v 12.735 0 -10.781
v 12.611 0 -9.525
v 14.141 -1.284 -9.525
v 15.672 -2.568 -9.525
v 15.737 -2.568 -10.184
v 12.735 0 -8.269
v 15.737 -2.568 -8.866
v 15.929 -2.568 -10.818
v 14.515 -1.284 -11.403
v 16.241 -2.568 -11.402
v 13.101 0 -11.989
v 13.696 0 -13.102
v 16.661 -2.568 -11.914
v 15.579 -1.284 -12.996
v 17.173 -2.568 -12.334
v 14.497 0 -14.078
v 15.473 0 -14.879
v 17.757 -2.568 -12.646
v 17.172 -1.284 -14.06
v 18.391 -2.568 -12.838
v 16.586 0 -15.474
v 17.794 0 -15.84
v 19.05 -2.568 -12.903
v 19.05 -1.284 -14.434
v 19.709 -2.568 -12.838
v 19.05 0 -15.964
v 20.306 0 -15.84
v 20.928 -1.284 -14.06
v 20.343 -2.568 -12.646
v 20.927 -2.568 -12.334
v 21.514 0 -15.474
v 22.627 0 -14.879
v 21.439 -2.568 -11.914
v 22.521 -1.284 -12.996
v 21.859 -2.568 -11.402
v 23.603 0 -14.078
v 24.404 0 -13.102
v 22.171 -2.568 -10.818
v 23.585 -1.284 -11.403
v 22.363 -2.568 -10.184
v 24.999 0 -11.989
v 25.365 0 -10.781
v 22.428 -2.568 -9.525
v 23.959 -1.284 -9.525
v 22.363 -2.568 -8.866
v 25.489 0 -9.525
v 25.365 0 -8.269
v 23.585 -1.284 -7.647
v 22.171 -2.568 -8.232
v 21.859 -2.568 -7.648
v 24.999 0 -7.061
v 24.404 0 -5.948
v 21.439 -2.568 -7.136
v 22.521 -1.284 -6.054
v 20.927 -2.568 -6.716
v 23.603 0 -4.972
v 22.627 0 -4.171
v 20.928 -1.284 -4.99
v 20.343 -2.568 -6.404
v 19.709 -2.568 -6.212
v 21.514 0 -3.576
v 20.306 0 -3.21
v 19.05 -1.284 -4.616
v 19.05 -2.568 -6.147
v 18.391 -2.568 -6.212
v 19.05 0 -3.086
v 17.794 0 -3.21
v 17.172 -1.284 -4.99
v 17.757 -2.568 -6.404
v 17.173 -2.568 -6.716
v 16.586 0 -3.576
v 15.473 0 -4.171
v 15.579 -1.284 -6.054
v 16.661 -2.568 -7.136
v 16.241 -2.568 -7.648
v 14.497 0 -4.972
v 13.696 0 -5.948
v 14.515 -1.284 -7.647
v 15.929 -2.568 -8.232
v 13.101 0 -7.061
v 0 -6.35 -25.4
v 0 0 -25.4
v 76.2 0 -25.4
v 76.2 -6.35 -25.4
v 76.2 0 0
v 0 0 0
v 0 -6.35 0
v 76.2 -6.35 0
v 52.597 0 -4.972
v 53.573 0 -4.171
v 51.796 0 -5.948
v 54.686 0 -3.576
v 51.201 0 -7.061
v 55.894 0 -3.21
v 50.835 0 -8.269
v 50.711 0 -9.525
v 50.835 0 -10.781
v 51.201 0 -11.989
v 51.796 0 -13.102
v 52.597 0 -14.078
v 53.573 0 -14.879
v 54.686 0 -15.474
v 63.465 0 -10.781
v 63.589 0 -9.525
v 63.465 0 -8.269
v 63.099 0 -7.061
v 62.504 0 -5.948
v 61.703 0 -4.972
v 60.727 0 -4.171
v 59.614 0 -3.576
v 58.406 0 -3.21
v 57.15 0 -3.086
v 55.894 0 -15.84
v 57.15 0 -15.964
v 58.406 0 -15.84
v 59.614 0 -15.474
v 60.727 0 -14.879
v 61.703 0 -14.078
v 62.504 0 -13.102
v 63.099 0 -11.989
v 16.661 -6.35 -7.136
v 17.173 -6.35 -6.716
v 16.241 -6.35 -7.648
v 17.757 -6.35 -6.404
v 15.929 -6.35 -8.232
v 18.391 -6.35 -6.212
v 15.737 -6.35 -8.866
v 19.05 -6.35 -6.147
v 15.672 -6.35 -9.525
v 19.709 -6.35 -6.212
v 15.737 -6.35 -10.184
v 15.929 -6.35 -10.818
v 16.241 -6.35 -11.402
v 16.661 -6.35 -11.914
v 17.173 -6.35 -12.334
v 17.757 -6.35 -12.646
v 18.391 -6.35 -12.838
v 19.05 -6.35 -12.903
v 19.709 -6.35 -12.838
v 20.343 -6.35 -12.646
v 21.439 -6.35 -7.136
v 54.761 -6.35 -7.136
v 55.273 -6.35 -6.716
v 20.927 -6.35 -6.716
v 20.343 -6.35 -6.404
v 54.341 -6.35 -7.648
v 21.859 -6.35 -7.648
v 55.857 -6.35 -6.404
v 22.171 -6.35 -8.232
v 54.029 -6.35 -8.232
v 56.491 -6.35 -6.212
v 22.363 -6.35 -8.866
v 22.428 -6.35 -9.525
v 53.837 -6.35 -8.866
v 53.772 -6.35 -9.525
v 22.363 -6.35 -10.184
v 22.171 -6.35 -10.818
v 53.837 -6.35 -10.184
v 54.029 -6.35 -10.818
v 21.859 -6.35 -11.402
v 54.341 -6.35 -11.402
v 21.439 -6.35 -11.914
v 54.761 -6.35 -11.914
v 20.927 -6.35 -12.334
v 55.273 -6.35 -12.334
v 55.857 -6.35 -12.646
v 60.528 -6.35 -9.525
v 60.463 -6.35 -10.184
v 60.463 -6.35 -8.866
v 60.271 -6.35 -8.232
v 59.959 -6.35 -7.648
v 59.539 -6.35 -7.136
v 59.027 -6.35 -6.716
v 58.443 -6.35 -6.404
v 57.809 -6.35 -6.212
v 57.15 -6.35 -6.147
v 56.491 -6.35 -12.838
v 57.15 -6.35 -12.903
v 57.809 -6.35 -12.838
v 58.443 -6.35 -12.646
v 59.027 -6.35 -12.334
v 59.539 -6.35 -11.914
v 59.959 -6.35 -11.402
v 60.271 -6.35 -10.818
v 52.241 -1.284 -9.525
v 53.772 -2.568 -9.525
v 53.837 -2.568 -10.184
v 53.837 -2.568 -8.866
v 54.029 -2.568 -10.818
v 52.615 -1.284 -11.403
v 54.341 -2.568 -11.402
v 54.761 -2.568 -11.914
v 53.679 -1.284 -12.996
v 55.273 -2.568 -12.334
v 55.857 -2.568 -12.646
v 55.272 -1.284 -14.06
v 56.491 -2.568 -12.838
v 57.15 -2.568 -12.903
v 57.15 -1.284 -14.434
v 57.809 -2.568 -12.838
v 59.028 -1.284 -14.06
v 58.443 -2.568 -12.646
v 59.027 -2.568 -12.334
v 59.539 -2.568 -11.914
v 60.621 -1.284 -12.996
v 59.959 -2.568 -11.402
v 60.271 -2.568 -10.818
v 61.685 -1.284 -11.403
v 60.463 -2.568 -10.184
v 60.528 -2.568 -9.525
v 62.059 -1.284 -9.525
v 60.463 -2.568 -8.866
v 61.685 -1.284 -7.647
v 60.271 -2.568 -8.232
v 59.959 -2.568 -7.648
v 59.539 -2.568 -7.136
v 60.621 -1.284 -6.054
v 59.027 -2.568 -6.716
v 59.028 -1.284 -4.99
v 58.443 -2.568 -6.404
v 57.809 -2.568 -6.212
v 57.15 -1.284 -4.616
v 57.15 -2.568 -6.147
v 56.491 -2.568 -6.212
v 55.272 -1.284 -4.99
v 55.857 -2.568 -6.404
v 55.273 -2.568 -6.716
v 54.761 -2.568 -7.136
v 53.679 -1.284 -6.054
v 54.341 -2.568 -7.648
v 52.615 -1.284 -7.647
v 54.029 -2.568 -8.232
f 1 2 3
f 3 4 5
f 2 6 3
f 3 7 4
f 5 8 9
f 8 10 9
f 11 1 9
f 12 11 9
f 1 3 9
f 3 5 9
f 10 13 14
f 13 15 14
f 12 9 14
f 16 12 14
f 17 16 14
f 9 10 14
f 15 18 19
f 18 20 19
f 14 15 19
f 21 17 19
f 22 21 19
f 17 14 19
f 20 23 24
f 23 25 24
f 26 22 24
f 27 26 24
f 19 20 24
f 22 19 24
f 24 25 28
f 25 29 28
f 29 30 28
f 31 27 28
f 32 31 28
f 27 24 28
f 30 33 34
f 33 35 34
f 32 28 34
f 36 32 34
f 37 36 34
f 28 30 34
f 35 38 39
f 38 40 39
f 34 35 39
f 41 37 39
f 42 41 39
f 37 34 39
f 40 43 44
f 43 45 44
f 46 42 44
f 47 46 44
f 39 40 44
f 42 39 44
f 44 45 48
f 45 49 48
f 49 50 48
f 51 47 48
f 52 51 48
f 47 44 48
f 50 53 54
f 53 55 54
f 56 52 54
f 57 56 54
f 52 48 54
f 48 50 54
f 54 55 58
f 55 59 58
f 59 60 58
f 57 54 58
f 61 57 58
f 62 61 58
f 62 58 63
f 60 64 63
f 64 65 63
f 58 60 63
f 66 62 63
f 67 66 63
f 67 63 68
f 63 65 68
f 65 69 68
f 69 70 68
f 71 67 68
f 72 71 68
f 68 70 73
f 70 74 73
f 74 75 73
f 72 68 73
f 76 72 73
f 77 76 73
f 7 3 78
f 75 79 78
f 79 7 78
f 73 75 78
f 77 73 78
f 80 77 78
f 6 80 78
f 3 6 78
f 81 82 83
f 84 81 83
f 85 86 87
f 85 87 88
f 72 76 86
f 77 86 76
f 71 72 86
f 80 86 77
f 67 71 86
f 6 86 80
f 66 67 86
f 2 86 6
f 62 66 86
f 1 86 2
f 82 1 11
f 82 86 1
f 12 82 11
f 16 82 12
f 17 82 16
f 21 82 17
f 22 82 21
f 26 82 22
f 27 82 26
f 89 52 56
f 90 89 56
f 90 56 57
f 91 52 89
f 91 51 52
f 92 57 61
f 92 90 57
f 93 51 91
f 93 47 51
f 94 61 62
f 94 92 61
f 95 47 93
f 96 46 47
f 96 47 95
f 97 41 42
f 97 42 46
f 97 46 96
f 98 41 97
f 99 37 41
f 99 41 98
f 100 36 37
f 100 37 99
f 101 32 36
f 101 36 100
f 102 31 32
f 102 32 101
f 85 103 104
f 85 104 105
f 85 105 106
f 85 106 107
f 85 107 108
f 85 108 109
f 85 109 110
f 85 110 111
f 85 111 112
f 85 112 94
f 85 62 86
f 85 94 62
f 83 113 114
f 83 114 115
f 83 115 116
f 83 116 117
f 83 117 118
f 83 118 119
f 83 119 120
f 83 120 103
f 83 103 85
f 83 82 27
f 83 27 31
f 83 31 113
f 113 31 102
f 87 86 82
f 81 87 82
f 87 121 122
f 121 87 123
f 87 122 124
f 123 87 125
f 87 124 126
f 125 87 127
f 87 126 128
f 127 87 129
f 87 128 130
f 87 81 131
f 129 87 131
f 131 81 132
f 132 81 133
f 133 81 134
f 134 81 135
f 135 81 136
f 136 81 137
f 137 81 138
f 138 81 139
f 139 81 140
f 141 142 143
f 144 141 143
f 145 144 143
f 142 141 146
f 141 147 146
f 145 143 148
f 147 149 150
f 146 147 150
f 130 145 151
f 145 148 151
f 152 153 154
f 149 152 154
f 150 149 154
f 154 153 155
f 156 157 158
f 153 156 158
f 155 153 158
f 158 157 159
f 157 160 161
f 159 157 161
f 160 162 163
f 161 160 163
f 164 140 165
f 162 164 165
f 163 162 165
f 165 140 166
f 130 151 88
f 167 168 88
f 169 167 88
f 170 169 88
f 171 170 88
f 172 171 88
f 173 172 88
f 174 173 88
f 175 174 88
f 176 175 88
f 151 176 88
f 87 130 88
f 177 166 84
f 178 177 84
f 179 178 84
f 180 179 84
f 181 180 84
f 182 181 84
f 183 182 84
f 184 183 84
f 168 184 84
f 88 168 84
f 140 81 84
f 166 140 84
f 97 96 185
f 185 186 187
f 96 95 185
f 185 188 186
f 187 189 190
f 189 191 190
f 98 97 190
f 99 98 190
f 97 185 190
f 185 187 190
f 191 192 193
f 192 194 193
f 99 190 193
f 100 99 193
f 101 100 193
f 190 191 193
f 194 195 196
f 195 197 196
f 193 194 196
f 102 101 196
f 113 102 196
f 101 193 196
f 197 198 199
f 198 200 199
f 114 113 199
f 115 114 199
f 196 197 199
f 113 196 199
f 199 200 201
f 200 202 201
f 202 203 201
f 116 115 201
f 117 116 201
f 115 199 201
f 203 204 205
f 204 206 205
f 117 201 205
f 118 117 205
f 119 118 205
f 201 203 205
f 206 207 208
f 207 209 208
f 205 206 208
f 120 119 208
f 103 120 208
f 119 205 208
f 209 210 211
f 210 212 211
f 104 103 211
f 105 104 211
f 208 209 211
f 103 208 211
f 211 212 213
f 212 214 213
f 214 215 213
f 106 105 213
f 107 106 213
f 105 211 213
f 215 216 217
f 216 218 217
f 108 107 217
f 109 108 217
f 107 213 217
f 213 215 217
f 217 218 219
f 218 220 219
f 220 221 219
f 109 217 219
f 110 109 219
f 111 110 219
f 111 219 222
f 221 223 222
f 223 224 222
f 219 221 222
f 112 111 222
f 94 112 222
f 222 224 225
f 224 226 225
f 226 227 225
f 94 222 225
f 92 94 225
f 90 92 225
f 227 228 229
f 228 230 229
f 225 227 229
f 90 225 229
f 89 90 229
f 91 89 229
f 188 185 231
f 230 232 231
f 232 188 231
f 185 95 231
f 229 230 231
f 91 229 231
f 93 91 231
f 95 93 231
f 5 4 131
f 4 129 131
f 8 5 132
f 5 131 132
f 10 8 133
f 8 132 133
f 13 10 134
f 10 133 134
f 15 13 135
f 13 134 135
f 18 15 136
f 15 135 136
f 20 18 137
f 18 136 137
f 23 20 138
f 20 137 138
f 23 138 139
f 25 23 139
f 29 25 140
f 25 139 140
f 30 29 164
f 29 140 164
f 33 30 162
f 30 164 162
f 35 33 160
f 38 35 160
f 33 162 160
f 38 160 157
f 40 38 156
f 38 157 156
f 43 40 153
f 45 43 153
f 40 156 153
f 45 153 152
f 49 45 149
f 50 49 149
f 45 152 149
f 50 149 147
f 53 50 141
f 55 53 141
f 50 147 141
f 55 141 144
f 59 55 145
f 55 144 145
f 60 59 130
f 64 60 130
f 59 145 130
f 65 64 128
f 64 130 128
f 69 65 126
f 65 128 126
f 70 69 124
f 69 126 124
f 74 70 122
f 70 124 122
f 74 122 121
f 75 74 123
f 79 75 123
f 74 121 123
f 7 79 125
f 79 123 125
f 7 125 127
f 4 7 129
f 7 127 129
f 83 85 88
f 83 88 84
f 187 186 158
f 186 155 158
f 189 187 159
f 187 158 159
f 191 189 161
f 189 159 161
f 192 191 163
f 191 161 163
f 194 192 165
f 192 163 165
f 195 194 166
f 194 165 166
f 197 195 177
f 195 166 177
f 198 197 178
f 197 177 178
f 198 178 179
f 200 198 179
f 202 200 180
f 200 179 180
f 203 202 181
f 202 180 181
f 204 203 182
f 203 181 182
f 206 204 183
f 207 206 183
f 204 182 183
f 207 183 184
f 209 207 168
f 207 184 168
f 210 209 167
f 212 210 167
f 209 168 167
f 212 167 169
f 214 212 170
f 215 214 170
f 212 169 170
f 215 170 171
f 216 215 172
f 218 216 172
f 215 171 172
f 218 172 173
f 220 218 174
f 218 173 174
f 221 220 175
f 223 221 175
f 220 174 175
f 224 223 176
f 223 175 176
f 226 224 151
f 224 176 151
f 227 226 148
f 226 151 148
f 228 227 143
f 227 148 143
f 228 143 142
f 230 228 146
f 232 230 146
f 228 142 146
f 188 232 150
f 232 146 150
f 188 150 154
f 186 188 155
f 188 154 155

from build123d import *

# Parameters (mm, degrees)
SKETCH1_W                                           = 76.2
SKETCH1_H                                           = 25.4
BOSS_EXTRUDE1_DEPTH                                 = 6.35
CSK_FOR_1_4_FLAT_HEAD_MACHINE_SCREW_100_D           = 6.7564
CSK_FOR_1_4_FLAT_HEAD_MACHINE_SCREW_100_CSINK_D     = 12.8778
CSK_FOR_1_4_FLAT_HEAD_MACHINE_SCREW_100_CSINK_ANGLE = 100


with BuildPart() as part:
    # Sketch1 → Boss-Extrude1 (new body)
    with BuildSketch(Plane(origin=(0, 0, 0), x_dir=(1, 0, 0), z_dir=(0, 1, 0))):
        with Locations((38.1, 12.7)):
            Rectangle(SKETCH1_W, SKETCH1_H)
    extrude(amount=-BOSS_EXTRUDE1_DEPTH)

    # CSK for 1/4 Flat Head Machine Screw (100)1 (through all)
    with Locations(Plane(origin=(0, 0, 0), x_dir=(1, 0, 0), z_dir=(0, 1, 0))):
        with Locations((19.05, 9.525), (57.15, 9.525)):
            CounterSinkHole(CSK_FOR_1_4_FLAT_HEAD_MACHINE_SCREW_100_D / 2, CSK_FOR_1_4_FLAT_HEAD_MACHINE_SCREW_100_CSINK_D / 2, counter_sink_angle=CSK_FOR_1_4_FLAT_HEAD_MACHINE_SCREW_100_CSINK_ANGLE)


solid = part.part
